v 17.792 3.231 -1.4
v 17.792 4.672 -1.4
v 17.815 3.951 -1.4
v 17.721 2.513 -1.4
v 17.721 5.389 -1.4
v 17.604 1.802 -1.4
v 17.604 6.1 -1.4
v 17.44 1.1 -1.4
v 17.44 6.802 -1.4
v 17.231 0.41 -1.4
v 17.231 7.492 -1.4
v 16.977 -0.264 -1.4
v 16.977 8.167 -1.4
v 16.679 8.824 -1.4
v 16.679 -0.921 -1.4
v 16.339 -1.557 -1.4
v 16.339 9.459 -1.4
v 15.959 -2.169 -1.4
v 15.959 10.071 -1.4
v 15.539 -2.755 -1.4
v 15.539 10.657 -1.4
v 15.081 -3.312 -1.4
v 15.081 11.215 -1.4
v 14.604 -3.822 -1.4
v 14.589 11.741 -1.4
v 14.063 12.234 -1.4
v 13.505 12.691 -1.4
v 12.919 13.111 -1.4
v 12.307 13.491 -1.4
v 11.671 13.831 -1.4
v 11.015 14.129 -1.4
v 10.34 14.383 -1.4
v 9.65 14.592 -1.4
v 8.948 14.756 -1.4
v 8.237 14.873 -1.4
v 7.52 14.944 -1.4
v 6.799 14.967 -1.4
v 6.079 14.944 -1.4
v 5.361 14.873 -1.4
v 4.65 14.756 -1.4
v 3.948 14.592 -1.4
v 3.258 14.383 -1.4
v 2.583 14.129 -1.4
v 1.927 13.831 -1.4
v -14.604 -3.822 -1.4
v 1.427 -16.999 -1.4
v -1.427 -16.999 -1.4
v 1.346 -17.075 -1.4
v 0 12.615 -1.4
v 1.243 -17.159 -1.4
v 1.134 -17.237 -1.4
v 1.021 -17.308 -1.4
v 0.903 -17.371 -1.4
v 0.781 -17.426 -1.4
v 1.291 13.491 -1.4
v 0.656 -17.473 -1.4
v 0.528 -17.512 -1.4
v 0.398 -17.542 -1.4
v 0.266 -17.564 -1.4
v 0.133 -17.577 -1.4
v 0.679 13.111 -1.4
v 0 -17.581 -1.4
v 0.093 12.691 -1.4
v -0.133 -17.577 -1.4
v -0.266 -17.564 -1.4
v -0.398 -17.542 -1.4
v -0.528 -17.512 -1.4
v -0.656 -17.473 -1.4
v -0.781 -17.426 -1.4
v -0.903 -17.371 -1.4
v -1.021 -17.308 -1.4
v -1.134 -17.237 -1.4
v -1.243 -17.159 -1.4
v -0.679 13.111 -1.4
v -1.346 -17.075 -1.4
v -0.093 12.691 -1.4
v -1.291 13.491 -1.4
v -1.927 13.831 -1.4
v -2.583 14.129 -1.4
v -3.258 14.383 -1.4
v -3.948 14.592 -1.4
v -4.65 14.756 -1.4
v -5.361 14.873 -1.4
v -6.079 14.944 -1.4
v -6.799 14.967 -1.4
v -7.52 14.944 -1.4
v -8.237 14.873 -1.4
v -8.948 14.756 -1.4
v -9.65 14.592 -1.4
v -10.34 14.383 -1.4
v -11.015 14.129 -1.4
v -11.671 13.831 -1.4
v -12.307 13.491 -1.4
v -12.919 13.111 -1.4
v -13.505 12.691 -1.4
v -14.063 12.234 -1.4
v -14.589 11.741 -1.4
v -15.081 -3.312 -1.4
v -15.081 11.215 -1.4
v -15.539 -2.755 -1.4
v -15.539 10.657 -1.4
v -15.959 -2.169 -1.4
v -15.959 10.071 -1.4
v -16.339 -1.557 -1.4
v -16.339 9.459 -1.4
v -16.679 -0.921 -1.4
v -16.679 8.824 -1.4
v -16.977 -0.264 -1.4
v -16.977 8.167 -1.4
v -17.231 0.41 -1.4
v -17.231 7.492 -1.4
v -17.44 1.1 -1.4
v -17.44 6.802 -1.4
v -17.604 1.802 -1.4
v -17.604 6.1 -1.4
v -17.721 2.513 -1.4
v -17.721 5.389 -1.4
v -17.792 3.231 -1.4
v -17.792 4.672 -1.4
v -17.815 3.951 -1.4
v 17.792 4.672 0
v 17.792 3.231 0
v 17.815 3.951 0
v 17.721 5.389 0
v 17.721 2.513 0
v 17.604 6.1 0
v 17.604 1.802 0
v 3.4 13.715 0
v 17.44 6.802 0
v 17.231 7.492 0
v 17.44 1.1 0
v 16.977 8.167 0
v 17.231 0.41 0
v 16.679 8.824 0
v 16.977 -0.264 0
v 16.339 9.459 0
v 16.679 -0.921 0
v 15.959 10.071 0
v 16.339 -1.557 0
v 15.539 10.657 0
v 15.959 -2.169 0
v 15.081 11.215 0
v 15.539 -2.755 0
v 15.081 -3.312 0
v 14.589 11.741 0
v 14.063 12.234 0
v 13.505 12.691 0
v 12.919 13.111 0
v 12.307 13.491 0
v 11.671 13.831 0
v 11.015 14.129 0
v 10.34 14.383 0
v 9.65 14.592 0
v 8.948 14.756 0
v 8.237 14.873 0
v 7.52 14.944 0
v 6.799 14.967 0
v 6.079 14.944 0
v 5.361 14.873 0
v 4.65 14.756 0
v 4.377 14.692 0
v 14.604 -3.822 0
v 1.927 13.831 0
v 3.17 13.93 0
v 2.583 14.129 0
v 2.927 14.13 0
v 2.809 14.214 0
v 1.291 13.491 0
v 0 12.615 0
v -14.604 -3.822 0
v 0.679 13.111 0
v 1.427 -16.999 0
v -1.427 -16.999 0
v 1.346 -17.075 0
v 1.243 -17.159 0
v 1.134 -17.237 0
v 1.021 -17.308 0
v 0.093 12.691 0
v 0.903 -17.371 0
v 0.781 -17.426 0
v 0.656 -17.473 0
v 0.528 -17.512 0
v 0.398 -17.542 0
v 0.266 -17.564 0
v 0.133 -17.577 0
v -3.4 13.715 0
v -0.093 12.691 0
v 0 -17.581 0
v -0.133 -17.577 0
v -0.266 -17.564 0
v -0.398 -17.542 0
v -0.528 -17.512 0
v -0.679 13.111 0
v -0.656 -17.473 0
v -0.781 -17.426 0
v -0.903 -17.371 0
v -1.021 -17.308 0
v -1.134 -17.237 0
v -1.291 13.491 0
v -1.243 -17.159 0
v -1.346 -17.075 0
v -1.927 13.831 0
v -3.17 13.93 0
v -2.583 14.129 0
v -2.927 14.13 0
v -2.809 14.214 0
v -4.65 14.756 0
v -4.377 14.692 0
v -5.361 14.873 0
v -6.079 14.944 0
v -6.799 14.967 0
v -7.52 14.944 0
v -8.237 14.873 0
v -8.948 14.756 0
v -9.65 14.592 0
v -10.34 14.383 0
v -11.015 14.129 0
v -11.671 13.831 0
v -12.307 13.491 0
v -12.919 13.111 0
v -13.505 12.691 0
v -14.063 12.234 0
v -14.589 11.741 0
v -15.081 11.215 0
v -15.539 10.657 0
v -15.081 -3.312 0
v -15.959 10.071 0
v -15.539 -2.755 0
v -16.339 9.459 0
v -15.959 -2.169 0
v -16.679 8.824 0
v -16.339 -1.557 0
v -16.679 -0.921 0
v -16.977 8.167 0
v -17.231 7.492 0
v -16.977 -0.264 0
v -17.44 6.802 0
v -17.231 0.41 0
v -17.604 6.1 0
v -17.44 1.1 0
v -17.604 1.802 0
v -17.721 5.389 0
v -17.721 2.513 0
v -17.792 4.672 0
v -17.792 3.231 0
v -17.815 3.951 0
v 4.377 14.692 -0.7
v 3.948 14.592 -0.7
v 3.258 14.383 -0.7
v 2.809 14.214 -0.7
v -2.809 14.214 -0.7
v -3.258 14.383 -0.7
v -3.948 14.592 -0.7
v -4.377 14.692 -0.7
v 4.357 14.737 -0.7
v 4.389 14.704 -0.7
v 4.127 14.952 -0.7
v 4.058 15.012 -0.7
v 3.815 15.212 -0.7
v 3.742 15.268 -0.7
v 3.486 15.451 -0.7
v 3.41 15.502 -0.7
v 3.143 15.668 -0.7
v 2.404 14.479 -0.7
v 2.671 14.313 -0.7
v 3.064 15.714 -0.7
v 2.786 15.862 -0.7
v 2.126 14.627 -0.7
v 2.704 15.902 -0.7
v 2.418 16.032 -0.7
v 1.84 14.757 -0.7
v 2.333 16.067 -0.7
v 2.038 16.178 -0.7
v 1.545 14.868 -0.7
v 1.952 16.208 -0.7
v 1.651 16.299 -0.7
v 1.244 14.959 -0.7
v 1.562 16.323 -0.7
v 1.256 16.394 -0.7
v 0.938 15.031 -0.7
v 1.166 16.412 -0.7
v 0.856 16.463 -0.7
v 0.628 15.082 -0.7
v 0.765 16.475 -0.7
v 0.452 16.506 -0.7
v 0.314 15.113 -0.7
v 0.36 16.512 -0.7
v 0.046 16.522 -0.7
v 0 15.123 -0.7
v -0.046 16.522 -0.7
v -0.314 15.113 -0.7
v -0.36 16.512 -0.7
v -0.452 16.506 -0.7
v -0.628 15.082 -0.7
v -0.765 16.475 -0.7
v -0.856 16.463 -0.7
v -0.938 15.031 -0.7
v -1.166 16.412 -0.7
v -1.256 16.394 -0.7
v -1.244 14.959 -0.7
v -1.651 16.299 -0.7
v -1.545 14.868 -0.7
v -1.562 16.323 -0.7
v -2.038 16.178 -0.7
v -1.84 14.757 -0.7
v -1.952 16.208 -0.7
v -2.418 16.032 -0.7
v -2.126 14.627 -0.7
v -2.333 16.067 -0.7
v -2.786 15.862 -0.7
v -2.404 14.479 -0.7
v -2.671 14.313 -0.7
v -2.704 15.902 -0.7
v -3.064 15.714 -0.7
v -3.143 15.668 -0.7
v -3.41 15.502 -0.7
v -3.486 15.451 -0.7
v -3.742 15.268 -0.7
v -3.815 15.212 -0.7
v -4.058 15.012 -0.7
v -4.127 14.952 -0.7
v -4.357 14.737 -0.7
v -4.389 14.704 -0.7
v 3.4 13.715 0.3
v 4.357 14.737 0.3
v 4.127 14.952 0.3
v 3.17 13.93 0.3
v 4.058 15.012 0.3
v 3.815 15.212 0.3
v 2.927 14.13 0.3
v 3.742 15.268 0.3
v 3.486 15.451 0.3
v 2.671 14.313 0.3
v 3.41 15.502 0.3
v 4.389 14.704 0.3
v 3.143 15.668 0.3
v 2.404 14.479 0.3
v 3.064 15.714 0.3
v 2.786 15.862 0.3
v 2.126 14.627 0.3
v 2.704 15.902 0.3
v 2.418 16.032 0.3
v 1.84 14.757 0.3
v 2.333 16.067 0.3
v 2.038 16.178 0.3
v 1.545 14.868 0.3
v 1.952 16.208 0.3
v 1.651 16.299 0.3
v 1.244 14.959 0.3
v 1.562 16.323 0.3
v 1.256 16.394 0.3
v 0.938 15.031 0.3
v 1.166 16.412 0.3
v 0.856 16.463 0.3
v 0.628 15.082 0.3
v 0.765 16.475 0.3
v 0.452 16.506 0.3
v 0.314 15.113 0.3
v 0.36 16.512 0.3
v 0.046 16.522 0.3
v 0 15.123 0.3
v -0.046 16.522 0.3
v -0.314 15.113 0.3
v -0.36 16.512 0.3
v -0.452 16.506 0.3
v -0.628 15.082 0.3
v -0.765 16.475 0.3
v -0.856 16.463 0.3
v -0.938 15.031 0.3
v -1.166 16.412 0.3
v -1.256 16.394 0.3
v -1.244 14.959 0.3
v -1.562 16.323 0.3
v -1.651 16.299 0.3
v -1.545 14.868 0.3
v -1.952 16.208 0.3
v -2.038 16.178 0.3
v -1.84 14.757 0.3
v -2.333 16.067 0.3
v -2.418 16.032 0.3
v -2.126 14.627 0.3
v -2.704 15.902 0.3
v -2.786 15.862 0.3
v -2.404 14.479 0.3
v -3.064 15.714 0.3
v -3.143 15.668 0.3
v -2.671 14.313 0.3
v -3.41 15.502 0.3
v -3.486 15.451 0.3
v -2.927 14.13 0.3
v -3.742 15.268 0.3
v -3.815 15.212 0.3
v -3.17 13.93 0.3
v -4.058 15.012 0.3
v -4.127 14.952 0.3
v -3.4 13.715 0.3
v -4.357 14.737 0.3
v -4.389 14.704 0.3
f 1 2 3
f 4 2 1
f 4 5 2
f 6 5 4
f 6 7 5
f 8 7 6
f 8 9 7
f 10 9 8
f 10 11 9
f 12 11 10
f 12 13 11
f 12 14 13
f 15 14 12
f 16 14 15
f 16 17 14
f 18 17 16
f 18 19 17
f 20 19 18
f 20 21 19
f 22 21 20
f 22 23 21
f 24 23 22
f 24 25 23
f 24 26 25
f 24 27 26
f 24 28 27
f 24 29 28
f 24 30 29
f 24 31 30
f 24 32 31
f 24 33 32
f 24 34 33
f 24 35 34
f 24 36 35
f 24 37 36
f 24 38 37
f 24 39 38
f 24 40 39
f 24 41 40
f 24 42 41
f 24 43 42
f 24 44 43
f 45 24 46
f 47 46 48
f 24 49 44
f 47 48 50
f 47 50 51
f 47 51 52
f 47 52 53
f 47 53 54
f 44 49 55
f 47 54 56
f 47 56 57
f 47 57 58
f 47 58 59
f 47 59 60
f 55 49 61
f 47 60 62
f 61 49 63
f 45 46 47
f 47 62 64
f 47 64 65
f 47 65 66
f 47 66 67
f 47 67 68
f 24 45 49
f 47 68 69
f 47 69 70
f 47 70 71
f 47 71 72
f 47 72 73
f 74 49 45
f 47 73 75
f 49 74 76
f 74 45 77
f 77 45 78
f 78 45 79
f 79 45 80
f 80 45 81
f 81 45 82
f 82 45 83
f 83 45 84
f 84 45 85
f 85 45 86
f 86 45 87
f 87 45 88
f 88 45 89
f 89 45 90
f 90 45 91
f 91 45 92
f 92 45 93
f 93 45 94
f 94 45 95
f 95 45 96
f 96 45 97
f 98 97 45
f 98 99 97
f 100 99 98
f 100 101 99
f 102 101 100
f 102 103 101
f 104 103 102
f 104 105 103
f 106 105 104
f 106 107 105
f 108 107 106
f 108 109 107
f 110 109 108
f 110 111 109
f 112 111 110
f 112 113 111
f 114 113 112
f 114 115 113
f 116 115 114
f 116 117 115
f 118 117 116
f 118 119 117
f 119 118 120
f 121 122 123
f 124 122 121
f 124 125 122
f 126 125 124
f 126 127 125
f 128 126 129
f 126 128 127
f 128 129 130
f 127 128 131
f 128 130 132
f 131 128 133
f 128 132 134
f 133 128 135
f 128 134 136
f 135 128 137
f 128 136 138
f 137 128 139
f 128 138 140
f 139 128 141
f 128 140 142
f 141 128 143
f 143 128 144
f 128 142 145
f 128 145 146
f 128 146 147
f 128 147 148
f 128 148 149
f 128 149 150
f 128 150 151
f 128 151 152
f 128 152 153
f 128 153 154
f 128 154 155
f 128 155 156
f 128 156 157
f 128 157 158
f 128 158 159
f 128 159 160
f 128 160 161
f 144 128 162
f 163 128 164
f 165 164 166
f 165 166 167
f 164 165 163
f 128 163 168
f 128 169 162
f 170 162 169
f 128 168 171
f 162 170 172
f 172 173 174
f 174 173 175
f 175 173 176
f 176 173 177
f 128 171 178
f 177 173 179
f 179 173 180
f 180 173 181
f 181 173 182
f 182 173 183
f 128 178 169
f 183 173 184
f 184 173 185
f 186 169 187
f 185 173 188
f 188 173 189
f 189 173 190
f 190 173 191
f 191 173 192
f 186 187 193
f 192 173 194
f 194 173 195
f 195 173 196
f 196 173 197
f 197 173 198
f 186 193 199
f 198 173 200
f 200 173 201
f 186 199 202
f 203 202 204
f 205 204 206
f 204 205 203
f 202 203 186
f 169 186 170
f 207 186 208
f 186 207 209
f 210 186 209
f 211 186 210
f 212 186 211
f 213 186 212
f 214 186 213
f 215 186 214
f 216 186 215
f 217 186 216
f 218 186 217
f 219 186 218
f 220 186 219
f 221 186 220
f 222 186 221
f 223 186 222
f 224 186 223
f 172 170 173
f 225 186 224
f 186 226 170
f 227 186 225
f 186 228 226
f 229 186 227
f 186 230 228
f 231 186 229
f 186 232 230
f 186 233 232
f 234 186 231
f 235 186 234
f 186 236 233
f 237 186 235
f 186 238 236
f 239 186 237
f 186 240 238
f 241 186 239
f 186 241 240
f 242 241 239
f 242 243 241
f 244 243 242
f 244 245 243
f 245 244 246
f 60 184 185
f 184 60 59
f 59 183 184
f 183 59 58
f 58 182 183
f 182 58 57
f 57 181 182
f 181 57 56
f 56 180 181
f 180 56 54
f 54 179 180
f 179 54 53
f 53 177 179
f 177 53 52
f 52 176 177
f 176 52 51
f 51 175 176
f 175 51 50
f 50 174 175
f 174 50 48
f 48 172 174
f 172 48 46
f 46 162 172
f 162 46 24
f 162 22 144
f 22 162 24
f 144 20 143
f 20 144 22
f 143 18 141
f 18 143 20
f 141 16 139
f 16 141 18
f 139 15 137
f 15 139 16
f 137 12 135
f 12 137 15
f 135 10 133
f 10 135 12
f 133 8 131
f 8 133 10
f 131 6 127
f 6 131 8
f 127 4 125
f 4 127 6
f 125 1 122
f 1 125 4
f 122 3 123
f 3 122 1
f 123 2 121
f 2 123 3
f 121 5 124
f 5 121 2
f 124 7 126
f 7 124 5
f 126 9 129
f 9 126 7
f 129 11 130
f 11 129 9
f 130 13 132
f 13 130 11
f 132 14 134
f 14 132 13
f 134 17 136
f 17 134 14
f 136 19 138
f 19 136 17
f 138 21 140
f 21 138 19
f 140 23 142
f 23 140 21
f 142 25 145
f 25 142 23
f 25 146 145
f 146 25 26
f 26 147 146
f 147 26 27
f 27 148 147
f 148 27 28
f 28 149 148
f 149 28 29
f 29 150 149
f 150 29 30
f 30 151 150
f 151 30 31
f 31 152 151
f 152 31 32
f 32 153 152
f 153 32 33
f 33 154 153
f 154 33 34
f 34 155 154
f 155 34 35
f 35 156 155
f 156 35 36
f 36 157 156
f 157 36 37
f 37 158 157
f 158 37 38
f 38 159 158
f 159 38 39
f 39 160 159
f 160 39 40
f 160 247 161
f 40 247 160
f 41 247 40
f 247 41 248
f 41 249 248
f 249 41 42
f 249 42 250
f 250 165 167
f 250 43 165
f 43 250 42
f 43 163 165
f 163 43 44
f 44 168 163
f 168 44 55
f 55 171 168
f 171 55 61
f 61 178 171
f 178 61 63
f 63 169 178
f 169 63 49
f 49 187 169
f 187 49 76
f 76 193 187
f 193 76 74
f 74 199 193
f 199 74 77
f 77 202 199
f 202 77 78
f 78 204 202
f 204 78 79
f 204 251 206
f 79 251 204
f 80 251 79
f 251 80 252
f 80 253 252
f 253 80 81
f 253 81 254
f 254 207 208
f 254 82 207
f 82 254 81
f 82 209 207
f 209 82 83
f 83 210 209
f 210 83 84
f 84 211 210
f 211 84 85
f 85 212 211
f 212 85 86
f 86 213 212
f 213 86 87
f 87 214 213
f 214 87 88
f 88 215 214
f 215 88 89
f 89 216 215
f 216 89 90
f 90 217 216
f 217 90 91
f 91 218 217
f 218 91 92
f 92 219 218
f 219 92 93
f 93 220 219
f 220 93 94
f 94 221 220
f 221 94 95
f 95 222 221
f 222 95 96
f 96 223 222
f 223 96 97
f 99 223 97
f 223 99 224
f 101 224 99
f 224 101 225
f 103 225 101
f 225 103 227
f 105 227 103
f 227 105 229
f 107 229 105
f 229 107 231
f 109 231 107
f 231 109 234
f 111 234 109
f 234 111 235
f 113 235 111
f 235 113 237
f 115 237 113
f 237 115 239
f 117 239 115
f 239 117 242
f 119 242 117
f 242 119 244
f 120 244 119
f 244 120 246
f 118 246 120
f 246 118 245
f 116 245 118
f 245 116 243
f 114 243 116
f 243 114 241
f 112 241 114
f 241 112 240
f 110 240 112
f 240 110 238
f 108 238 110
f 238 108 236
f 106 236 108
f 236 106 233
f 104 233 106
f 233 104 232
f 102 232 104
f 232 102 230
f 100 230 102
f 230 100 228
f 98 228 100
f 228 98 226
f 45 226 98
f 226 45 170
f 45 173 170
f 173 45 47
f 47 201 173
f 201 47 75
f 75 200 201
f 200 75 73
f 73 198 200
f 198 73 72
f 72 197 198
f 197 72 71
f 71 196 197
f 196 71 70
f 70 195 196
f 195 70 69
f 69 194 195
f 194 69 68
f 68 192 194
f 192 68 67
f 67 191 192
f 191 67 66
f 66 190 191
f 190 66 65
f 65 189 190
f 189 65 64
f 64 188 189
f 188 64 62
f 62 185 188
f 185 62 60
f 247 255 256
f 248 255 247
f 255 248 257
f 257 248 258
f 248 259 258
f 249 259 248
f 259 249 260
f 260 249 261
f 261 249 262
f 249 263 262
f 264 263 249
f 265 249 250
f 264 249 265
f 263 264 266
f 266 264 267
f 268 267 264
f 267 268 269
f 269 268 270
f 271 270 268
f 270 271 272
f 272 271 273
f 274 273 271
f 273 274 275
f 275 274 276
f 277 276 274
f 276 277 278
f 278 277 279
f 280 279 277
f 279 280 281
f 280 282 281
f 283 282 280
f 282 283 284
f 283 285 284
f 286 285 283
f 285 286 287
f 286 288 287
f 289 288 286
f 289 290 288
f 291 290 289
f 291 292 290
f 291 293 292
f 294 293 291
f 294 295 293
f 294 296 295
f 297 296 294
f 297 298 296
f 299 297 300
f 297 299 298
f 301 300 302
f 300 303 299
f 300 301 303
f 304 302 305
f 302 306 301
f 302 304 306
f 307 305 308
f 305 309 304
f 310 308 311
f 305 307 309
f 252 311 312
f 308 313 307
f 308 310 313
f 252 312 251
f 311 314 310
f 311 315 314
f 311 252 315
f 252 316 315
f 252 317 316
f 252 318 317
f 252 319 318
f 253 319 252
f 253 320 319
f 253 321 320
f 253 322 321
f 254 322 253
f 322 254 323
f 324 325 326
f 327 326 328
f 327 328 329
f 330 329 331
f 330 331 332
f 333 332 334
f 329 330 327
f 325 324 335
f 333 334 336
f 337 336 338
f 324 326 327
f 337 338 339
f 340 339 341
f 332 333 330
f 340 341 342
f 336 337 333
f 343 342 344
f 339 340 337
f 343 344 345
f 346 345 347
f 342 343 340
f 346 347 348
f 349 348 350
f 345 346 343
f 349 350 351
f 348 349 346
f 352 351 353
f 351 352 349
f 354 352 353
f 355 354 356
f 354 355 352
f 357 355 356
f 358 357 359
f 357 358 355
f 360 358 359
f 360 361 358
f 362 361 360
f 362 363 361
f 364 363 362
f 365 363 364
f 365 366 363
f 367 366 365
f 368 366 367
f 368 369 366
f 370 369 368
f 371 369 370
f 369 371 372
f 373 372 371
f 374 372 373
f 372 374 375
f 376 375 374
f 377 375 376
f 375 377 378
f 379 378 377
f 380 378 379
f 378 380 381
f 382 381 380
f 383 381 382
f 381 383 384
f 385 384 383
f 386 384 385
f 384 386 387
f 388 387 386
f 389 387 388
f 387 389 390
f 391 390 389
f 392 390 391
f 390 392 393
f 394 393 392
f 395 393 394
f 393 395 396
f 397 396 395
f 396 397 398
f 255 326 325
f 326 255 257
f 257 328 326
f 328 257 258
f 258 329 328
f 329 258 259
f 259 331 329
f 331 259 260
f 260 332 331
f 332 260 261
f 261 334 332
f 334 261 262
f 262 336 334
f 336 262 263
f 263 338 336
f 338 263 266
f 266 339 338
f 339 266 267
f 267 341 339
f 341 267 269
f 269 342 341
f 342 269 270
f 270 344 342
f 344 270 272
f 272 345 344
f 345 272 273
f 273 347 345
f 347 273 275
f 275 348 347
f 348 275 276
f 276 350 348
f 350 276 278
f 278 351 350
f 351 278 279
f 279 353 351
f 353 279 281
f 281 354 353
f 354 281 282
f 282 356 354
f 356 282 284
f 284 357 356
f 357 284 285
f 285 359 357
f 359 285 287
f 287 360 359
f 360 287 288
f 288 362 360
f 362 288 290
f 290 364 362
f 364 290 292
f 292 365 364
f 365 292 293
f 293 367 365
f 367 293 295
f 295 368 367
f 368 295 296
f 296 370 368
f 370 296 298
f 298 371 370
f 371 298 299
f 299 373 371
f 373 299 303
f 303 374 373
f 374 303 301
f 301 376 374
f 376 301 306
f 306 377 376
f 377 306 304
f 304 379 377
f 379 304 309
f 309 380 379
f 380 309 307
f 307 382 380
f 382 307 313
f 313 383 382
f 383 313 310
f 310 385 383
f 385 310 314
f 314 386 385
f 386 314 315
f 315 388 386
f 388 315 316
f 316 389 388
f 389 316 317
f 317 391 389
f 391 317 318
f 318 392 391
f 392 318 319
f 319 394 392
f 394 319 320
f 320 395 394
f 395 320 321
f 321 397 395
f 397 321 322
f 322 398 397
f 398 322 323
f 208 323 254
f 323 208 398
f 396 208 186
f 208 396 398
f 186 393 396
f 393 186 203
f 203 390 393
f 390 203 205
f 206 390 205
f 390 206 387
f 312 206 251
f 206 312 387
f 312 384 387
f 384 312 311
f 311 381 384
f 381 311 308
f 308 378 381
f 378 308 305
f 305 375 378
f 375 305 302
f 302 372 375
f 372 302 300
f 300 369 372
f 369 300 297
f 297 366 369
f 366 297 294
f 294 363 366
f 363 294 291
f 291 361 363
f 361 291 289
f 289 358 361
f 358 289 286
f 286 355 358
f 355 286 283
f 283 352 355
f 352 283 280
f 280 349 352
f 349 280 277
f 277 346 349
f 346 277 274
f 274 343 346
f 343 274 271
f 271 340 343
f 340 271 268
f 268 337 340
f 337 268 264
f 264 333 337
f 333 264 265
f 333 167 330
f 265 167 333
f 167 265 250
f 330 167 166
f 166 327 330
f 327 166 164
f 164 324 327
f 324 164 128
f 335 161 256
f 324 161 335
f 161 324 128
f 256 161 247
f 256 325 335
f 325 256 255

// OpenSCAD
heart_height = 30;
wall_thickness = 1.4;
wall_height = 1;
cblocks = 15;
levels = 3;
tip_factor = 15;
bottom = "YES";
ring = "YES";  

// give a [x, y] point and length. draw a line in the x direction
module x_line(point, length, thickness = 1) {
    offset = thickness / 2;
    translate([point[0] - offset, point[1] - offset, 0]) 
        square([length + thickness, thickness]);
}


module a_quarter_arc(radius, angle, width = 1) {
    outer = radius + width;
    intersection() {
        difference() {
            offset(r = width) circle(radius, $fn=96); 
            circle(radius, $fn=96);
        }
        polygon([[0, 0], [outer, 0], [outer, outer * sin(angle)], [outer * cos(angle), outer * sin(angle)]]);
    }
}

module arc(radius, angles, width = 1) {
    angle_from = angles[0];
    angle_to = angles[1];
    angle_difference = angle_to - angle_from;
    outer = radius + width;
    rotate(angle_from)
        if(angle_difference <= 90) {
            a_quarter_arc(radius, angle_difference, width);
        } else if(angle_difference > 90 && angle_difference <= 180) {
            arc(radius, [0, 90], width);
            rotate(90) a_quarter_arc(radius, angle_difference - 90, width);
        } else if(angle_difference > 180 && angle_difference <= 270) {
            arc(radius, [0, 180], width);
            rotate(180) a_quarter_arc(radius, angle_difference - 180, width);
        } else if(angle_difference > 270 && angle_difference <= 360) {
            arc(radius, [0, 270], width);
            rotate(270) a_quarter_arc(radius, angle_difference - 270, width);
       }
}

/*
 * constants, for clearness
 *
 */
 
// random directions, for picking up a direction to visit the next block
function PERMUTATION_OF_FOUR() = [
    [1, 2, 3, 4],
    [1, 2, 4, 3],
    [1, 3, 2, 4],
    [1, 3, 4, 2],
    [1, 4, 2, 3],
    [1, 4, 3, 2],
    [2, 1, 3, 4],
    [2, 1, 4, 3],
    [2, 3, 1, 4],
    [2, 3, 4, 1],
    [2, 4, 1, 3],
    [2, 4, 3, 1],
    [3, 1, 2, 4],
    [3, 1, 4, 2],
    [3, 2, 1, 4],
    [3, 2, 4, 1],
    [3, 4, 1, 2],
    [3, 4, 2, 1],
    [4, 1, 2, 3],
    [4, 1, 3, 2],
    [4, 2, 1, 3],
    [4, 2, 3, 1],
    [4, 3, 1, 2],
    [4, 3, 2, 1]
];

function NO_WALL() = 0;
function UP_WALL() = 1;
function RIGHT_WALL() = 2;
function UP_RIGHT_WALL() = 3;

function NOT_VISITED() = 0;
function VISITED() = 1;

/* 
 * utilities functions
 *
 */

// comare the equality of [x1, y1] and [x2, y2]
function cord_equals(cord1, cord2) = cord1 == cord2;

// is the point visited?
function not_visited(cord, vs, index = 0) =
    index == len(vs) ? true : 
        (cord_equals([vs[index][0], vs[index][1]], cord) && vs[index][2] == 1 ? false :
            not_visited(cord, vs, index + 1));
            
// pick a direction randomly
function rand_dirs() =
    PERMUTATION_OF_FOUR()[round(rands(0, 24, 1)[0])]; 

// replace v1 in the vector with v2 
function replace(v1, v2, vs) =
    [for(i = [0:len(vs) - 1]) vs[i] == v1 ? v2 : vs[i]];
    
/* 
 * functions for generating a maze vector
 *
 */

// initialize a maze
function init_maze(rows, columns) = 
    [
	    for(c = [1 : columns]) 
	        for(r = [1 : rows]) 
		        [c, r, 0,  UP_RIGHT_WALL()]
	];
    
// find a vector in the maze vector
function find(i, j, maze_vector, index = 0) =
    index == len(maze_vector) ? [] : (
        cord_equals([i, j], [maze_vector[index][0], maze_vector[index][1]]) ? maze_vector[index] : find(i, j, maze_vector, index + 1)
    );

////
// NO_WALL = 0;
// UP_WALL = 1;
// RIGHT_WALL = 2;
// UP_RIGHT_WALL = 3;
function delete_right_wall(original_block) = 
    original_block == NO_WALL() || original_block == RIGHT_WALL() ? NO_WALL() : UP_WALL();

function delete_up_wall(original_block) = 
    (original_block == NO_WALL() || original_block == UP_WALL()) ? NO_WALL() : RIGHT_WALL();
    
function delete_right_wall_of(vs, is_visited, maze_vector) =
    replace(vs, [vs[0], vs[1] , is_visited, delete_right_wall(vs[3])] ,maze_vector);

function delete_up_wall_of(vs, is_visited, maze_vector) =
    replace(vs, [vs[0], vs[1] , is_visited, delete_up_wall(vs[3])] ,maze_vector);

function go_right(i, j, rows, columns, maze_vector) =
    go_maze(i + 1, j, rows, columns, delete_right_wall_of(find(i, j, maze_vector), VISITED(), maze_vector));
    
function go_up(i, j, rows, columns, maze_vector) =
    go_maze(i, j - 1, rows, columns, delete_up_wall_of(find(i, j, maze_vector), VISITED(), maze_vector));
    
function visit(v, maze_vector) =
    replace(v, [v[0], v[1], VISITED(), v[3]], maze_vector);
 
function go_left(i, j, rows, columns, maze_vector) =
    go_maze(i - 1, j, rows, columns, delete_right_wall_of(find(i - 1, j, maze_vector), NOT_VISITED(), maze_vector));
    
function go_down(i, j, rows, columns, maze_vector) =
    go_maze(i, j + 1, rows, columns, delete_up_wall_of(find(i, j + 1, maze_vector), NOT_VISITED(), maze_vector));
    
function go_maze(i, j, rows, columns, maze_vector) =
    look_around(i, j, rand_dirs(), rows, columns, visit(find(i, j, maze_vector), maze_vector));
    
function look_around(i, j, dirs, rows, columns, maze_vector, index = 0) =
    index == 4 ? maze_vector : 
        look_around( 
            i, j, dirs, 
            rows, columns, 
            build_wall(i, j, dirs[index], rows, columns, maze_vector), 
            index + 1
        ); 

function build_wall(i, j, n, rows, columns, maze_vector) = 
    n == 1 && i != columns && not_visited([i + 1, j], maze_vector) ? go_right(i, j, rows, columns, maze_vector) : ( 
        n == 2 && j != 1 && not_visited([i, j - 1], maze_vector) ? go_up(i, j, rows, columns, maze_vector)  : (
            n == 3 && i != 1 && not_visited([i - 1, j], maze_vector) ? go_left(i, j,rows, columns,  maze_vector)  : (
                n == 4 && j != rows && not_visited([i, j + 1], maze_vector) ? go_down(i, j, rows, columns, maze_vector) : maze_vector
            ) 
        )
    ); 

// The heart is composed of two semi-circles and two isosceles triangles. 
// The triangle's two equal sides have length equals to the double `radius` of the circle.
// That's why the `solid_heart` module is drawn according a `radius` parameter.
module solid_heart(radius, tip_factor) {
    offset_h = 2.2360679774997896964091736687313 * radius / 2 - radius * sin(45);
	tip_radius = radius / tip_factor;
	
    translate([radius * cos(45), offset_h, 0]) rotate([0, 0, -45])
    hull() {
        circle(radius, $fn = 96);
		translate([radius - tip_radius, -radius * 2 + tip_radius, 0]) 
		    circle(tip_radius, center = true, $fn = 96);
	}
	
	translate([-radius * cos(45), offset_h, 0]) rotate([0, 0, 45]) hull() {
        circle(radius, $fn = 96);
		translate([-radius + tip_radius, -radius * 2 + tip_radius, 0]) 
		    circle(tip_radius, center = true, $fn = 96);
	}
}

module ring_heart(radius, tip_factor, thickness) {
    difference() { 
	    offset(delta = thickness) solid_heart(radius, tip_factor);
        solid_heart(radius, tip_factor);
	}
}

module ring_heart_sector(radius, angle, tip_factor, thickness, width) {
	intersection() {
		ring_heart(radius - 0.1, tip_factor, thickness + 0.2);
		rotate([0, 0, angle]) x_line([0, 0], radius * 3, thickness, width);
	}
}

module heart_to_heart_wall(radius, length, angle, tip_factor, thickness) {
    intersection() {
        difference() {
            solid_heart(radius + length, tip_factor);
		    solid_heart(radius, tip_factor);
	    }
	    rotate([0, 0, angle]) 
		    x_line([0, 0], (radius + length) * 2, thickness);
	}
}

module heart_maze(radius, cblocks, levels, tip_factor, height = 1, thickness = 1) {
    full_circle_angle = 360;
    arc_angle = full_circle_angle / cblocks;
	r = radius / (levels + 1);
	
	maze = go_maze(1, 1, cblocks, levels, replace([levels, cblocks - 1, 0, UP_RIGHT_WALL()], [levels, cblocks - 1, 0, UP_WALL()], init_maze(cblocks, levels)));
	
	
	difference() {
		linear_extrude(height) union() {
			for(i = [1 : levels + 1]) {
				ring_heart(r * i, tip_factor, thickness);
			}
		  
		  
			for(i = [0:len(maze) - 1]) { 
				cord = maze[i];
				cr = cord[0]; 
				cc = cord[1] - 1;    
				v = cord[3];
				
				angle = cc * arc_angle;
				 
				if(v == 1 || v == 3) { 
					heart_to_heart_wall(r * cr, r, cc * arc_angle + 90, tip_factor, thickness);
				} 
			}
	    }
		
		
		linear_extrude(height) union() {
		    // maze entry
		    ring_heart_sector(r, 1.5 * arc_angle + 90, tip_factor, thickness, r - thickness / 2);

	        // road to the next level
			for(i = [0:len(maze) - 1]) { 
				cord = maze[i];
				cr = cord[0]; 
				cc = cord[1] - 1;    
				v = cord[3];
				
				if(v == 0 || v == 1) {
					ring_heart_sector(r * (cr + 1), (cc + 0.5) * arc_angle + 90, tip_factor, thickness, r - thickness / 2);
				}  
			}
		}
	}
}

heart_maze(heart_height / 3.12, cblocks, levels, tip_factor, wall_height, wall_thickness);

if(bottom == "YES") {
    translate([0, 0, -wall_thickness]) 
	    linear_extrude(wall_thickness) 
		    offset(delta = wall_thickness) 
			    solid_heart(heart_height / 3.12, tip_factor, wall_thickness);
}

if(ring == "YES") {
    if(bottom == "YES")  {
	    translate([0, heart_height / 3.12 +  wall_thickness / 2, -wall_thickness / 2]) 
			linear_extrude(wall_height) 
				arc(heart_height / 3.12 / 2, [45, 135], wall_thickness);
	} else {
	    translate([0, heart_height / 3.12 + wall_thickness / 2, 0]) 
			linear_extrude(wall_height) 
				arc(heart_height / 3.12 / 2, [45, 135], wall_thickness);
	}
}
